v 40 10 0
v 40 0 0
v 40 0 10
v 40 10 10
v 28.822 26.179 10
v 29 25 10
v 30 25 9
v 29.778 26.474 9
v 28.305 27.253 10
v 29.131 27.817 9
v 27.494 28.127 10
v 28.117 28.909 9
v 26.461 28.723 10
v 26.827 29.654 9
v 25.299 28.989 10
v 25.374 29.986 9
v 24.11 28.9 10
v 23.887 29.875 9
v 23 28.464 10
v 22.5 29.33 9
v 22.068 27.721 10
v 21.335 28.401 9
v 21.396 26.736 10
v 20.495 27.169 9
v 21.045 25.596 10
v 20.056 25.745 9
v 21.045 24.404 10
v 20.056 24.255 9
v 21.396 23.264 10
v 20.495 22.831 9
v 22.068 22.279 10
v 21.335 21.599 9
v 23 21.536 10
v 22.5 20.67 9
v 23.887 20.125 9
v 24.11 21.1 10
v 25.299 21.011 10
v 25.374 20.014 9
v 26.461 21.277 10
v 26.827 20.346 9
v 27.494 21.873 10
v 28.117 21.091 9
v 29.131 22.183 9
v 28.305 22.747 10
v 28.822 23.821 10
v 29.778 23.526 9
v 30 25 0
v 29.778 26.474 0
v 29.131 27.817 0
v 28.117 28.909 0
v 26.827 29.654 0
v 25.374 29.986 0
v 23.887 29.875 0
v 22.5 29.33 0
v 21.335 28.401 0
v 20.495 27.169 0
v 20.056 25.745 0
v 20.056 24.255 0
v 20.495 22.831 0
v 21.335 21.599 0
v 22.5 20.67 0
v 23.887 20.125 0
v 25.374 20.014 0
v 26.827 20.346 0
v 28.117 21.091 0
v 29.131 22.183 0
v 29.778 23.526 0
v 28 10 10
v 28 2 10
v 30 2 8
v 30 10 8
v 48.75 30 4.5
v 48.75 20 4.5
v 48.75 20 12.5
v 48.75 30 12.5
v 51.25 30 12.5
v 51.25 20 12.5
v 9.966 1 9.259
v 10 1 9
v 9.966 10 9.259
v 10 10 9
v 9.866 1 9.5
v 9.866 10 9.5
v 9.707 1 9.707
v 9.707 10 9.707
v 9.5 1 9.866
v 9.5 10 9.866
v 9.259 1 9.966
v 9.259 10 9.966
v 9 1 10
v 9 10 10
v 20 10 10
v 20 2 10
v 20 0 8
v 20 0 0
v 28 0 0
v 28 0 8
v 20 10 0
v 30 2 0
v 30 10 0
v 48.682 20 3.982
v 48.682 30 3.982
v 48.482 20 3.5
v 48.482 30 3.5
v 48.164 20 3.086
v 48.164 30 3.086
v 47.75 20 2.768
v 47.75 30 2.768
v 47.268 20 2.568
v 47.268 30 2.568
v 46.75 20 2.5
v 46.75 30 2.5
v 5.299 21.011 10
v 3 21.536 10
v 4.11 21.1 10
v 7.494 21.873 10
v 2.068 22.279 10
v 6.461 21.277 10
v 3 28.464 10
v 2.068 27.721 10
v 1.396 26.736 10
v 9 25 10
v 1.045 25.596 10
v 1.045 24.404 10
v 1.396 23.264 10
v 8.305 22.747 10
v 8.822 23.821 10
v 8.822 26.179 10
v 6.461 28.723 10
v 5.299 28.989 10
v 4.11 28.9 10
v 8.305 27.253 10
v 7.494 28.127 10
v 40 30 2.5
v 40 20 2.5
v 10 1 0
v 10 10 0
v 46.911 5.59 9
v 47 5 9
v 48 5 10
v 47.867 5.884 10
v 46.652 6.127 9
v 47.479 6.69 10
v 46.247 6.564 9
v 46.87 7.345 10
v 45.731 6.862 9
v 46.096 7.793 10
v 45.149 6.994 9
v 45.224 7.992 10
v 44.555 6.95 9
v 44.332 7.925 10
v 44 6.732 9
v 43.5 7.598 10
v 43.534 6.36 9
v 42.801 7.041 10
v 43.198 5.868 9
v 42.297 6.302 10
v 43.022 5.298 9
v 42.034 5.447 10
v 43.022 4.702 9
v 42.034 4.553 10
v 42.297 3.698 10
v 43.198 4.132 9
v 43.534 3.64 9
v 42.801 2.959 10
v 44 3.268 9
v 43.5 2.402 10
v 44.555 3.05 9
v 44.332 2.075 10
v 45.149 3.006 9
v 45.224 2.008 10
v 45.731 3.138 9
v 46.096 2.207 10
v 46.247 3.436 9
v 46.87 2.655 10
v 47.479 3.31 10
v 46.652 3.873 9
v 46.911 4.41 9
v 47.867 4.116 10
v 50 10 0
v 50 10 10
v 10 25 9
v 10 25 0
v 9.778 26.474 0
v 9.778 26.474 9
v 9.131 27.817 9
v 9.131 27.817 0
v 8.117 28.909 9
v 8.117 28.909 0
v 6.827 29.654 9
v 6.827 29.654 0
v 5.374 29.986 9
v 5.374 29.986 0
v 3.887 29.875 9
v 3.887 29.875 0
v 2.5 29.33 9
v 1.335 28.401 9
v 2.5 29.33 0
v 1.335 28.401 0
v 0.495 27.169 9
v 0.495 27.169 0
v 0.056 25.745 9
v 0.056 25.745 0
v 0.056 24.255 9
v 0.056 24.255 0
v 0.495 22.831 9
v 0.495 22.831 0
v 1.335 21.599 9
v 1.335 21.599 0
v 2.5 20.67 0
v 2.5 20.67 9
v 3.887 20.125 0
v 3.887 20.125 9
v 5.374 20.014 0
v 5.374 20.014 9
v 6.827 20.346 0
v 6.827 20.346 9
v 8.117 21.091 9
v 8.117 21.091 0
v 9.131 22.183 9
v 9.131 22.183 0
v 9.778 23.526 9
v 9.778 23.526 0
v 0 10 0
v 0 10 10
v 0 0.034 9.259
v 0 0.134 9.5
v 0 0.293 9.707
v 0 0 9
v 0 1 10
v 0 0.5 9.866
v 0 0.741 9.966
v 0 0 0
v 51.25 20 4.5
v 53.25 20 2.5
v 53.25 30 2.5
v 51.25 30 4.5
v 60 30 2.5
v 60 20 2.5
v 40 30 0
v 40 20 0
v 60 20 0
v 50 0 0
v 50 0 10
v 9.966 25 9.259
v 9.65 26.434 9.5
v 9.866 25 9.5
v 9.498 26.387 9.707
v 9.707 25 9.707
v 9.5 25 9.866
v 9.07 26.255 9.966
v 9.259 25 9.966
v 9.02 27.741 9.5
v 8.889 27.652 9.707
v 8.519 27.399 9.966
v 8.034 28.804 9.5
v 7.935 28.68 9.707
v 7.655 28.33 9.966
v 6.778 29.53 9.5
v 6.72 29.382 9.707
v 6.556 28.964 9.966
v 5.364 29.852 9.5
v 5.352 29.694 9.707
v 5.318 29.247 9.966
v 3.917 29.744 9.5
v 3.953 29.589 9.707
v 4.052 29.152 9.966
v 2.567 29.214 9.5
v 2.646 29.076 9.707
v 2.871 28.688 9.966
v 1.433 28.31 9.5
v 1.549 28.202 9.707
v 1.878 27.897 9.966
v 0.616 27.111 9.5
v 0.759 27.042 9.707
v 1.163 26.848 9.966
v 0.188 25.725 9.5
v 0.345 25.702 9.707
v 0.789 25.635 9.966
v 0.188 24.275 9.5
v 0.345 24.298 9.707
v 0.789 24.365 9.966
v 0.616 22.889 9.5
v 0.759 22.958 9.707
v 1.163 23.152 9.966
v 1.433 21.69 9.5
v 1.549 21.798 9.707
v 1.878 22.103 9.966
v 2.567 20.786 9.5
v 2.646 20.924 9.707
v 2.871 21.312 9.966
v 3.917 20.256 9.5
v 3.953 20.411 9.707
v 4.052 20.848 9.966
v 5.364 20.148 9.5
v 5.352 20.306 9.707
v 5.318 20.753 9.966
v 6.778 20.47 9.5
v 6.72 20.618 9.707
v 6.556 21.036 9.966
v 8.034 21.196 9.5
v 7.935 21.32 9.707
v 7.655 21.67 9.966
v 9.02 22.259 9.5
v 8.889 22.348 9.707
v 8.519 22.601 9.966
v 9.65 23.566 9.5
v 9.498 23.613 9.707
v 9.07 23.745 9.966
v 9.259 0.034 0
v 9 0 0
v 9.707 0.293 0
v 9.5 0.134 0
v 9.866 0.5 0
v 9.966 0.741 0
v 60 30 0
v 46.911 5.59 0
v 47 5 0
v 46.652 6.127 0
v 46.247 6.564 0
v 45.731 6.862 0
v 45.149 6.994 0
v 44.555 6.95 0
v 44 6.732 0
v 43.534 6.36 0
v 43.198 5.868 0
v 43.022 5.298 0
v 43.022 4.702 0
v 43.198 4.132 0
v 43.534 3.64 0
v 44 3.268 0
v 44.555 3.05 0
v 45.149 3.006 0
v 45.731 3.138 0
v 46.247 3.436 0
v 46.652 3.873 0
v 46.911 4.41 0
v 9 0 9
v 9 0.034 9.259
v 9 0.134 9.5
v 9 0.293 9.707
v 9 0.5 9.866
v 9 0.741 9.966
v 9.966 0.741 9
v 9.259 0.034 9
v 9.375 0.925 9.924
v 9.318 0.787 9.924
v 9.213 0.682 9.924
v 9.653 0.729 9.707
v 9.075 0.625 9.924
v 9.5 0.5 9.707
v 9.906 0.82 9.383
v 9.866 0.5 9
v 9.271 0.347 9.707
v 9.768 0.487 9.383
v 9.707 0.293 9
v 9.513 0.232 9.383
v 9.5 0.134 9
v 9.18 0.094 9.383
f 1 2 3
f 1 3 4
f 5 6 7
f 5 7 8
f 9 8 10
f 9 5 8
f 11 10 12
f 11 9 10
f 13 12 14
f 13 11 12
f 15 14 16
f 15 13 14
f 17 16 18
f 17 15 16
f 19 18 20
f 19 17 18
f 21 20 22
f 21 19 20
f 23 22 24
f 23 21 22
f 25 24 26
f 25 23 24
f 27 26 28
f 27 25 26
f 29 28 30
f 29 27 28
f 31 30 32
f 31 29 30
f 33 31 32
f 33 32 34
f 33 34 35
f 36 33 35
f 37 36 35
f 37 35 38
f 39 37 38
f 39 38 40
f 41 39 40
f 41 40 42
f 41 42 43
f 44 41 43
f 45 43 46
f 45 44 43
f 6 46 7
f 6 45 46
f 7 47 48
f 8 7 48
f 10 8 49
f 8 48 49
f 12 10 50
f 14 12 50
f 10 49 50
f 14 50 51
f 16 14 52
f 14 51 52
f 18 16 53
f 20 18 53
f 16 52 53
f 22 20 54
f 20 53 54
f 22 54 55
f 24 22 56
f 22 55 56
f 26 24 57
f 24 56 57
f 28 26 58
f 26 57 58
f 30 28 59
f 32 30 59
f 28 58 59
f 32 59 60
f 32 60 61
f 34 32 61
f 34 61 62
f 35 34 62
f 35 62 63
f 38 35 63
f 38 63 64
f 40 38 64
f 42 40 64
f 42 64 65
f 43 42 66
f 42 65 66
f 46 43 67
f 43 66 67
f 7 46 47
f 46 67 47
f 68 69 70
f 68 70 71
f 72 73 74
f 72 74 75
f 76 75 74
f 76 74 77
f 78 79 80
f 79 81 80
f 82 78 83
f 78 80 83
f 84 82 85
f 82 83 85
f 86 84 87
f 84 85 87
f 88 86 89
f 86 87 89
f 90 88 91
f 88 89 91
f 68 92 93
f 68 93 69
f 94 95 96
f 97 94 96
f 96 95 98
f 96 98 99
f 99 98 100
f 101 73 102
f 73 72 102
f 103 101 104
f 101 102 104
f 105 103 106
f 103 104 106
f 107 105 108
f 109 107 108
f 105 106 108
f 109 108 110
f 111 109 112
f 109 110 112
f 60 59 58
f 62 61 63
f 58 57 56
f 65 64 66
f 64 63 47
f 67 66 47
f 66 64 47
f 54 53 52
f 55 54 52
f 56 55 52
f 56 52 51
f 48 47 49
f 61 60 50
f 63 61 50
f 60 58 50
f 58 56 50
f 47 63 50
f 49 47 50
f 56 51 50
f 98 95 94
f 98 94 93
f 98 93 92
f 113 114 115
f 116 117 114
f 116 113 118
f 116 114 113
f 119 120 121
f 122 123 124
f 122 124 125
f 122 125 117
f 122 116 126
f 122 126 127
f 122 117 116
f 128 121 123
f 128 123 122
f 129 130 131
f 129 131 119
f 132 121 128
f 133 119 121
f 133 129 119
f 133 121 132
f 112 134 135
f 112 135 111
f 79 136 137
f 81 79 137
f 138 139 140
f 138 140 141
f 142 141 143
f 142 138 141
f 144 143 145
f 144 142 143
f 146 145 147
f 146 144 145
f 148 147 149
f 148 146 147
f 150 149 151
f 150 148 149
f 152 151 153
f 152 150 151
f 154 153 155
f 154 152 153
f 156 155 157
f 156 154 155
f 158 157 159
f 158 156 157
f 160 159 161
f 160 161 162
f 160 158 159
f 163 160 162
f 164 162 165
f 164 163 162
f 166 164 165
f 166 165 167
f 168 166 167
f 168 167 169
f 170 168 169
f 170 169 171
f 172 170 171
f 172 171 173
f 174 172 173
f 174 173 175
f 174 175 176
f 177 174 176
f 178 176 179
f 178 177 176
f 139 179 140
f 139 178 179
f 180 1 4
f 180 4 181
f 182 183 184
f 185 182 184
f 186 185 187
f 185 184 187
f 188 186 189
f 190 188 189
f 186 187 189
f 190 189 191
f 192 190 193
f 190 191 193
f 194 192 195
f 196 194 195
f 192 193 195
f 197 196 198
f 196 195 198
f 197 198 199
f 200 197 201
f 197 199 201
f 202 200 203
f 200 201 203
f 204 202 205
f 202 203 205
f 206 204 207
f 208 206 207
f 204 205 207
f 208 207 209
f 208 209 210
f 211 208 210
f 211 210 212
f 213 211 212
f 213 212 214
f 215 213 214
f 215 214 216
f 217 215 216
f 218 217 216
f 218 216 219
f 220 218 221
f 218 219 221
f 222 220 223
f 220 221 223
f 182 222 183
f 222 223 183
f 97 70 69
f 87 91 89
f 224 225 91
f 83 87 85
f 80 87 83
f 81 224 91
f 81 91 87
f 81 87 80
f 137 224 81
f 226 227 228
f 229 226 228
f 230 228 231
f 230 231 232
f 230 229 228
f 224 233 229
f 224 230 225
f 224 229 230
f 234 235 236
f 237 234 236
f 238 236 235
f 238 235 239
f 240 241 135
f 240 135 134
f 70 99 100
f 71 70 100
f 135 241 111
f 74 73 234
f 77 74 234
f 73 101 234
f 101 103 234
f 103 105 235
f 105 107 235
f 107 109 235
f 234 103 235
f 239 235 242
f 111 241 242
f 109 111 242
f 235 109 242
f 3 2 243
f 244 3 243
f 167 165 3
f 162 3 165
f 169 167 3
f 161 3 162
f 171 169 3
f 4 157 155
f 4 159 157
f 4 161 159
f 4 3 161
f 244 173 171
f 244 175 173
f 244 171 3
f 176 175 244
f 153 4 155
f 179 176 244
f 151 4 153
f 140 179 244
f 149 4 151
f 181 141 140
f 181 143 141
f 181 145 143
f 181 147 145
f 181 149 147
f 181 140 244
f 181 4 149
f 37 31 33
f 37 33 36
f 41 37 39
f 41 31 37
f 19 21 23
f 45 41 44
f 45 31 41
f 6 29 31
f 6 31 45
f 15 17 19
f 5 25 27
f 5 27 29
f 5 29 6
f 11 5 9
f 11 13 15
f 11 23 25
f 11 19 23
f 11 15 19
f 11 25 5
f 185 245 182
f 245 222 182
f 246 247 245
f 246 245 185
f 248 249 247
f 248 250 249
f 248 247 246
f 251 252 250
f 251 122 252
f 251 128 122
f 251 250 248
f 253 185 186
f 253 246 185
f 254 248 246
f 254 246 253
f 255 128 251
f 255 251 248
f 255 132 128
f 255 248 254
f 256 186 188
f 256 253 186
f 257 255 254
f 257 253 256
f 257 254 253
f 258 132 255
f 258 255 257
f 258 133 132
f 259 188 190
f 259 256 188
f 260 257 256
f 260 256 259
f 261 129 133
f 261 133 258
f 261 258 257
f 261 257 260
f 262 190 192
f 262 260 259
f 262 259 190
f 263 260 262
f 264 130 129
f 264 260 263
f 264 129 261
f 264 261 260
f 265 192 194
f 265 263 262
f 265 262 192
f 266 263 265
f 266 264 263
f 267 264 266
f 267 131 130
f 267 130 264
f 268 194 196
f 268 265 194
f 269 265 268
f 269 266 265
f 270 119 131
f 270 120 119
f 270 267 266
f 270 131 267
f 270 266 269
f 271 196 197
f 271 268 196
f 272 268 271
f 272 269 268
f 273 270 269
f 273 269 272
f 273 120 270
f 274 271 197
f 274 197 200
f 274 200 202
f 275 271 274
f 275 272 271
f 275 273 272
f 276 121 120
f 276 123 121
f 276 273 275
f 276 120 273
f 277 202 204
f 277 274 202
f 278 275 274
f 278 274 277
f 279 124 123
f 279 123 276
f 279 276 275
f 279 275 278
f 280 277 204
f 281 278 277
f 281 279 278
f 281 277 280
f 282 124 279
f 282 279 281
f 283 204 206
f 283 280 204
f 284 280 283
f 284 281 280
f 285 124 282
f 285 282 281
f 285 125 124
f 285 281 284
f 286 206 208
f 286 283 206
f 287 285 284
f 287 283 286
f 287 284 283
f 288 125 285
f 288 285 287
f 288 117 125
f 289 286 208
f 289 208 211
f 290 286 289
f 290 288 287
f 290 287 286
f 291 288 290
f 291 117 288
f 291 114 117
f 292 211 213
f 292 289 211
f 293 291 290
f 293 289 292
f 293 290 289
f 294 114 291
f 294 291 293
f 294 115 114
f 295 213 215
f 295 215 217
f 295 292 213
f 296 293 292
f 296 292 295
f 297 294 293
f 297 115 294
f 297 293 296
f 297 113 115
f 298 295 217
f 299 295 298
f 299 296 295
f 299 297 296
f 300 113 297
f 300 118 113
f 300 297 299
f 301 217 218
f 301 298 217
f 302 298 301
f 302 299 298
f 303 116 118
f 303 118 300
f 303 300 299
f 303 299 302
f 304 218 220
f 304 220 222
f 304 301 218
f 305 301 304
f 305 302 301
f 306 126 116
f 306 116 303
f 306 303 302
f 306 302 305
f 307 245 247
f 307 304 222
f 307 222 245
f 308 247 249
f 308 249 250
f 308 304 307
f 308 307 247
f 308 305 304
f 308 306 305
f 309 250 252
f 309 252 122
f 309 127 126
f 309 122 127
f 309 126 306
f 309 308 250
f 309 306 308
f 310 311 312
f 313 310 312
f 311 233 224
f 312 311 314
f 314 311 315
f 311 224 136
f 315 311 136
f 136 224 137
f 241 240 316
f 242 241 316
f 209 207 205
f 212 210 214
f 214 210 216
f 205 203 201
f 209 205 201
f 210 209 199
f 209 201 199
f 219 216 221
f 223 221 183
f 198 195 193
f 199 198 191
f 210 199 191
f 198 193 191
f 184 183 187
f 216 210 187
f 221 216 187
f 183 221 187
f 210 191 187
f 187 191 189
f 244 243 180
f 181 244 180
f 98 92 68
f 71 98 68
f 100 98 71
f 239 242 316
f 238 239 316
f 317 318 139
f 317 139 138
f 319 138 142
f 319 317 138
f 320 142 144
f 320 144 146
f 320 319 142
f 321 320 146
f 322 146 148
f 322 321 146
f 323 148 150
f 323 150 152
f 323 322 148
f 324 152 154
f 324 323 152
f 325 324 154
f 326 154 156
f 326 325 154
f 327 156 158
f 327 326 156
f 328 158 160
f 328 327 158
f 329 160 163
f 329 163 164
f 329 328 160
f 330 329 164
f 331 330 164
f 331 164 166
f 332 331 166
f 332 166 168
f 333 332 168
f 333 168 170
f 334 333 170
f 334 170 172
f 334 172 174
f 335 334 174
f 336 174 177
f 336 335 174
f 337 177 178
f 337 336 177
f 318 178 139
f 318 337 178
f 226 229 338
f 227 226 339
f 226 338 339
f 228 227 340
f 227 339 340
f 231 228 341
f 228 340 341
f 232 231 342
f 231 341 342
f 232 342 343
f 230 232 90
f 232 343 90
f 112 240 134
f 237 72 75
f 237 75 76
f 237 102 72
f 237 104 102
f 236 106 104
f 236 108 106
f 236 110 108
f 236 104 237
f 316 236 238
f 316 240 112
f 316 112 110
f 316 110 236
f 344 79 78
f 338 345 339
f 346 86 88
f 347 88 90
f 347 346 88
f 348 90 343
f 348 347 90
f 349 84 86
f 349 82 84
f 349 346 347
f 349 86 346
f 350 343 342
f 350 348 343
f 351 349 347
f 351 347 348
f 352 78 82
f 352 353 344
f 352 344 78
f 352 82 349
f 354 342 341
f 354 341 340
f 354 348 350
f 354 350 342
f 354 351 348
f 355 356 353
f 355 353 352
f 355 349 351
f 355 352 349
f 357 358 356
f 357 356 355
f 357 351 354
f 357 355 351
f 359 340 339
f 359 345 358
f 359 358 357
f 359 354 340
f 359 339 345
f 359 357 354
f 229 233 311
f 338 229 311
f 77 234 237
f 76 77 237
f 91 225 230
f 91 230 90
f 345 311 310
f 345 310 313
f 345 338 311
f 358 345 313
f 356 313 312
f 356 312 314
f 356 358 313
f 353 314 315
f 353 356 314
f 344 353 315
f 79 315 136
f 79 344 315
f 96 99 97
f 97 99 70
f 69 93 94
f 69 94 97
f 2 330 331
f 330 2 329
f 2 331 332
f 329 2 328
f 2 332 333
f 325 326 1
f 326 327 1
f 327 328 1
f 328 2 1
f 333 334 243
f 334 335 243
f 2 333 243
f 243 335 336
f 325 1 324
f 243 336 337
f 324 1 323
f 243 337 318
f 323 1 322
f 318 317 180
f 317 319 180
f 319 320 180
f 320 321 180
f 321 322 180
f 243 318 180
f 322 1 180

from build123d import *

# Parameters (mm, degrees)
BOX_W             = 10
BOX_H             = 10
BOX_DEPTH         = 10
FILLET_R          = 1
BOX001_W          = 10
BOX001_H          = 10
BOX001_DEPTH      = 10
CHAMFER_SIZE      = 2
CYLINDER_R        = 2
CYLINDER_DEPTH    = 10
BOX002_W          = 10
BOX002_H          = 10
BOX002_DEPTH      = 10
CHAMFER001_SIZE   = 1
CYLINDER001_R     = 5
CYLINDER001_DEPTH = 10
FILLET001_R       = 1
CYLINDER002_R     = 5
CYLINDER002_DEPTH = 10
CHAMFER002_SIZE   = 1
BOX003_W          = 20
BOX003_H          = 10
BOX003_DEPTH      = 2.5
BOX004_W          = 2.5
BOX004_H          = 10
BOX004_DEPTH      = 12.5
CHAMFER003_SIZE   = 2
FILLET002_R       = 2


with BuildPart() as fillet_body:
    # Box → Box (new body)
    with BuildSketch(Plane.XY):
        with Locations((5, 5)):
            Rectangle(BOX_W, BOX_H)
    extrude(amount=BOX_DEPTH)

    # Fillet
    fillet_edges = [fillet_body.edges().sort_by_distance(p)[0] for p in [
        (10, 0, 5),
        (10, 5, 10),
        (5, 0, 10),
    ]]
    fillet(fillet_edges, radius=FILLET_R)


with BuildPart() as chamfer_body:
    # Box001 → Box001 (new body)
    with BuildSketch(Plane(origin=(20, 0, 0), x_dir=(1, 0, 0), z_dir=(0, 0, 1))):
        with Locations((5, 5)):
            Rectangle(BOX001_W, BOX001_H)
    extrude(amount=BOX001_DEPTH)

    # Chamfer
    chamfer_edges = [chamfer_body.edges().sort_by_distance(p)[0] for p in [
        (30, 0, 5),
        (30, 5, 10),
        (25, 0, 10),
    ]]
    chamfer(chamfer_edges, length=CHAMFER_SIZE)


with BuildPart() as cylinder:
    # Cylinder → Cylinder (new body)
    with BuildSketch(Plane(origin=(45, 5, 0), x_dir=(1, 0, 0), z_dir=(0, 0, 1))):
        Circle(CYLINDER_R)
    extrude(amount=CYLINDER_DEPTH)


with BuildPart() as chamfer001:
    # Box002 → Box002 (new body)
    with BuildSketch(Plane(origin=(40, 0, 0), x_dir=(1, 0, 0), z_dir=(0, 0, 1))):
        with Locations((5, 5)):
            Rectangle(BOX002_W, BOX002_H)
    extrude(amount=BOX002_DEPTH)

    # Cut: cut Cylinder
    add(cylinder.part, mode=Mode.SUBTRACT)

    # Chamfer001
    chamfer001_edges = [chamfer001.edges().sort_by_distance(p)[0] for p in [
        (43, 5, 10),
    ]]
    chamfer(chamfer001_edges, length=CHAMFER001_SIZE)


with BuildPart() as fillet001:
    # Cylinder001 → Cylinder001 (new body)
    with BuildSketch(Plane(origin=(5, 25, 0), x_dir=(1, 0, 0), z_dir=(0, 0, 1))):
        Circle(CYLINDER001_R)
    extrude(amount=CYLINDER001_DEPTH)

    # Fillet001
    fillet001_edges = [fillet001.edges().sort_by_distance(p)[0] for p in [
        (0, 25, 10),
    ]]
    fillet(fillet001_edges, radius=FILLET001_R)


with BuildPart() as chamfer002:
    # Cylinder002 → Cylinder002 (new body)
    with BuildSketch(Plane(origin=(25, 25, 0), x_dir=(1, 0, 0), z_dir=(0, 0, 1))):
        Circle(CYLINDER002_R)
    extrude(amount=CYLINDER002_DEPTH)

    # Chamfer002
    chamfer002_edges = [chamfer002.edges().sort_by_distance(p)[0] for p in [
        (20, 25, 10),
    ]]
    chamfer(chamfer002_edges, length=CHAMFER002_SIZE)


with BuildPart() as cube003:
    # Box003 → Box003 (new body)
    with BuildSketch(Plane(origin=(40, 20, 0), x_dir=(1, 0, 0), z_dir=(0, 0, 1))):
        with Locations((10, 5)):
            Rectangle(BOX003_W, BOX003_H)
    extrude(amount=BOX003_DEPTH)


with BuildPart() as fillet002:
    # Box004 → Box004 (new body)
    with BuildSketch(Plane(origin=(48.75, 20, 0), x_dir=(1, 0, 0), z_dir=(0, 0, 1))):
        with Locations((1.25, 5)):
            Rectangle(BOX004_W, BOX004_H)
    extrude(amount=BOX004_DEPTH)

    # Fusion: union Cube003
    add(cube003.part)

    # Chamfer003
    chamfer003_edges = [fillet002.edges().sort_by_distance(p)[0] for p in [
        (51.25, 25, 2.5),
    ]]
    chamfer(chamfer003_edges, length=CHAMFER003_SIZE)

    # Fillet002
    fillet002_edges = [fillet002.edges().sort_by_distance(p)[0] for p in [
        (48.75, 25, 2.5),
    ]]
    fillet(fillet002_edges, radius=FILLET002_R)


solid = Compound([fillet_body.part, chamfer_body.part, chamfer001.part, fillet001.part, chamfer002.part, fillet002.part])
